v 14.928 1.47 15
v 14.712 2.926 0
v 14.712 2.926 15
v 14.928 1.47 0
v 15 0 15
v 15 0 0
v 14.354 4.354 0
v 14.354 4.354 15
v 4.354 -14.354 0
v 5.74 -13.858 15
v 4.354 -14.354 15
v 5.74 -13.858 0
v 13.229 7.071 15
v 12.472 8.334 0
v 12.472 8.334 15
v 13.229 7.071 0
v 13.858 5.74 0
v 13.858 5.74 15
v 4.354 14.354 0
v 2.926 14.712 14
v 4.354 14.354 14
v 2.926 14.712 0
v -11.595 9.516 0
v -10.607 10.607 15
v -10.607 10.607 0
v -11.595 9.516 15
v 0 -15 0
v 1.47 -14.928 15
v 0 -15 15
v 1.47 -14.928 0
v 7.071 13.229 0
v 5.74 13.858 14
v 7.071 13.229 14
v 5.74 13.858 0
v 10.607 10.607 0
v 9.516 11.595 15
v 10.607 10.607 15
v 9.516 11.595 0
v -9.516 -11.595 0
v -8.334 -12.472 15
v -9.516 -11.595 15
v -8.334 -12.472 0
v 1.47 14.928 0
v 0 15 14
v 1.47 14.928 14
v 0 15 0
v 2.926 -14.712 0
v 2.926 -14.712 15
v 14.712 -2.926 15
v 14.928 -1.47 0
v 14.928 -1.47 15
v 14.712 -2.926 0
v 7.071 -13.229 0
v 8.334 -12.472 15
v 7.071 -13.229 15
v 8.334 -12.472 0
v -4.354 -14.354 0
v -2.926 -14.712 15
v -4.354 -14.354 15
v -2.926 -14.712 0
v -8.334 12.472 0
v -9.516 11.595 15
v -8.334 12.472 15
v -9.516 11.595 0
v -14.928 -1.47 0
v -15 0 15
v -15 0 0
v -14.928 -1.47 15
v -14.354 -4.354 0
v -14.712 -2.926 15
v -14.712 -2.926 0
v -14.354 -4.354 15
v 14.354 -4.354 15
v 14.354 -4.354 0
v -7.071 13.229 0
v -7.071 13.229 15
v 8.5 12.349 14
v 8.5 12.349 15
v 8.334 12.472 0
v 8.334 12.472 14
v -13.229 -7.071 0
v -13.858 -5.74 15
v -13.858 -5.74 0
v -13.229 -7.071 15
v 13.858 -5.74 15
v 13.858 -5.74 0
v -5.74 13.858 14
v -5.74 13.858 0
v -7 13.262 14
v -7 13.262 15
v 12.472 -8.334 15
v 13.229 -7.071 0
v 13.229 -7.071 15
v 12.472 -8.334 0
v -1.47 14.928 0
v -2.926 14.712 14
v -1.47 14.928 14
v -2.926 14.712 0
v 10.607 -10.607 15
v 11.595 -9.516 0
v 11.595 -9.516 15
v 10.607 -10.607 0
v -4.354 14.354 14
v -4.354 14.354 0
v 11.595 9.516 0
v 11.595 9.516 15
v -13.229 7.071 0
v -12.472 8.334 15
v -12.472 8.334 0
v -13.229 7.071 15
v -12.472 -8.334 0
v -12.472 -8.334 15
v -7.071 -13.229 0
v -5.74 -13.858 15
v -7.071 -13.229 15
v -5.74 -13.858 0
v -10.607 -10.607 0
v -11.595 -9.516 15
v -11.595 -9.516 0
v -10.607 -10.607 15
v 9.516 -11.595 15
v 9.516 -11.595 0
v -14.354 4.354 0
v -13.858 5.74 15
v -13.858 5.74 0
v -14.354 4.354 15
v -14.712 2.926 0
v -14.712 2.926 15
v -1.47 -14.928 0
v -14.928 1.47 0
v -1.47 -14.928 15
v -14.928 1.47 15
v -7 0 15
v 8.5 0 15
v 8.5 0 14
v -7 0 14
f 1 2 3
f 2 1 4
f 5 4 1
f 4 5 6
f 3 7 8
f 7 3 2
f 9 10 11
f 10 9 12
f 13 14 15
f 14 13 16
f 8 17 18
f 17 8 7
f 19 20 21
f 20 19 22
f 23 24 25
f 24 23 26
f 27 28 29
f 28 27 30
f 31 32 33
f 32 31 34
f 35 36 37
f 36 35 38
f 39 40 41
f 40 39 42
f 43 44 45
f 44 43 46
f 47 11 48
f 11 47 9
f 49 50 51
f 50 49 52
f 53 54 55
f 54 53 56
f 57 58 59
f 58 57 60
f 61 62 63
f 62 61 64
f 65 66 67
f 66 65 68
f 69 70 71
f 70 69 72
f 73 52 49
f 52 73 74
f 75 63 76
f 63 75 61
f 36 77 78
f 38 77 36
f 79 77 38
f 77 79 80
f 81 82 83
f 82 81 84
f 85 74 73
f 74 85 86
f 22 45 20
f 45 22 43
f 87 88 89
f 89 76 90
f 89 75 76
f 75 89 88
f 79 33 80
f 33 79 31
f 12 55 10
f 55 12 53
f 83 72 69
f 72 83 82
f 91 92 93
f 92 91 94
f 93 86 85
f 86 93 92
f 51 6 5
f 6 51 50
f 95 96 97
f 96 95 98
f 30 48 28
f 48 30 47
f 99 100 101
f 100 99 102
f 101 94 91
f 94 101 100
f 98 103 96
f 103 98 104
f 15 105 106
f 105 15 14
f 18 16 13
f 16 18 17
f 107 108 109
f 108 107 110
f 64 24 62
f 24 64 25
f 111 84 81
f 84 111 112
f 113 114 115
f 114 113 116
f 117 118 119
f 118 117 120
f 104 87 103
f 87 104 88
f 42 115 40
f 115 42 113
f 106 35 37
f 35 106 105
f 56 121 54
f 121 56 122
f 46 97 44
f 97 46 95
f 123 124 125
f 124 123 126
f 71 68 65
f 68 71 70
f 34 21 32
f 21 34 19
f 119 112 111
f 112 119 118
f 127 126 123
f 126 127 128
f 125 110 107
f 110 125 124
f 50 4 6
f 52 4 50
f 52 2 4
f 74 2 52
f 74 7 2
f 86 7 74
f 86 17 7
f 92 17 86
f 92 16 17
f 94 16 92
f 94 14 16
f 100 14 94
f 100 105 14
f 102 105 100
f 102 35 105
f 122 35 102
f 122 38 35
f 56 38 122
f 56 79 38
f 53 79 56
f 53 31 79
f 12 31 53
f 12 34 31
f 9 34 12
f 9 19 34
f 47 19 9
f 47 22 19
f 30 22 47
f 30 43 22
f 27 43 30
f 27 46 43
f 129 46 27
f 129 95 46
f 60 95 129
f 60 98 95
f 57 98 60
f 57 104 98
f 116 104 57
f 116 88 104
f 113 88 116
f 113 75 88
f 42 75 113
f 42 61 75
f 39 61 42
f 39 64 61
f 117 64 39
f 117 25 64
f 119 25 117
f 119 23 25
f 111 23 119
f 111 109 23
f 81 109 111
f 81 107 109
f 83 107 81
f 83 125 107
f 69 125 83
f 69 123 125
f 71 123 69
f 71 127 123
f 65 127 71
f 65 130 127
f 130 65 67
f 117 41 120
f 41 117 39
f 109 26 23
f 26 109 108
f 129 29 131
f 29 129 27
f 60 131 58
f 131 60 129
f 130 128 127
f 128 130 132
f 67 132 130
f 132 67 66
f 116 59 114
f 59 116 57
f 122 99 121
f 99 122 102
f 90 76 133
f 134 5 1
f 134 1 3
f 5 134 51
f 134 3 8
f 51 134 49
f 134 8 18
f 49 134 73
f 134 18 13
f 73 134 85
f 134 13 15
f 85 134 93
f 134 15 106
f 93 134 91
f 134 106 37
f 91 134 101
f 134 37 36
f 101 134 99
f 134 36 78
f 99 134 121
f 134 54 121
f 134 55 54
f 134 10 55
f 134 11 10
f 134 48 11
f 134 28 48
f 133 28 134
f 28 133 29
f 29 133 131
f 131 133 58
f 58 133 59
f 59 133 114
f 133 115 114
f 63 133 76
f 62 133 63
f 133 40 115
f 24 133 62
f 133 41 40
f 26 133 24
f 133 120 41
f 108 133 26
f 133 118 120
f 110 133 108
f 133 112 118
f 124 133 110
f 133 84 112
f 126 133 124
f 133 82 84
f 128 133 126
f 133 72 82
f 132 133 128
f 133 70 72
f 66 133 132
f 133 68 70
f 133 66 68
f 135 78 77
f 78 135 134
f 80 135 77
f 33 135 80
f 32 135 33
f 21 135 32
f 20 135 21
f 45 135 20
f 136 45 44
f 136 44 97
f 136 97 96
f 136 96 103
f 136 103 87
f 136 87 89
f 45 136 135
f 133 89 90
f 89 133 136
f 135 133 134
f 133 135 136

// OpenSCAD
// Replacement knob for a hotplate stirrer - a cylinder with a D-shaped blind bore and a
// pointer groove, and with a ring of grip grooves around the outside. NOVEL general part.
//

bottom   = 30;
height   = 15;
shaft_d  = 6.2;
flat     = 4.7;
grooves  = 18;
pointer  = 1.5;

$fn = 64;

difference() {
    cylinder(h = height, d = bottom);
    translate([0, 0, -1])
        intersection() {
            cylinder(h = height + 2, d = shaft_d);
            translate([0, -100, 0]) rotate([0, 90, 0]) cylinder(h = height + 2, d = flat);
        };
    translate([0, -100, height - 1])
        cylinder(h = 2, d = bottom);   // guard plane for the outer grooves
    for (i = [0 : grooves - 1])
        rotate([0, 0, i * 360 / grooves])
            translate([bottom / 2, -100, 0]) cylinder(h = height + 2, d = 2);
    translate([0, 0, height - 1])
        circle(d = bottom - 2);       // guard plane for the pointer groove
    pointer_w = 1.5;
    pointer_d = bottom / 2 - 1;      // start the groove off-centre so it does not overlap the D bore
    translate([-(bottom / 2 - 1 - pointer_d / 2), 0, height - 1])
        cube([pointer_d + pointer_w, bottom, 2]);
}
